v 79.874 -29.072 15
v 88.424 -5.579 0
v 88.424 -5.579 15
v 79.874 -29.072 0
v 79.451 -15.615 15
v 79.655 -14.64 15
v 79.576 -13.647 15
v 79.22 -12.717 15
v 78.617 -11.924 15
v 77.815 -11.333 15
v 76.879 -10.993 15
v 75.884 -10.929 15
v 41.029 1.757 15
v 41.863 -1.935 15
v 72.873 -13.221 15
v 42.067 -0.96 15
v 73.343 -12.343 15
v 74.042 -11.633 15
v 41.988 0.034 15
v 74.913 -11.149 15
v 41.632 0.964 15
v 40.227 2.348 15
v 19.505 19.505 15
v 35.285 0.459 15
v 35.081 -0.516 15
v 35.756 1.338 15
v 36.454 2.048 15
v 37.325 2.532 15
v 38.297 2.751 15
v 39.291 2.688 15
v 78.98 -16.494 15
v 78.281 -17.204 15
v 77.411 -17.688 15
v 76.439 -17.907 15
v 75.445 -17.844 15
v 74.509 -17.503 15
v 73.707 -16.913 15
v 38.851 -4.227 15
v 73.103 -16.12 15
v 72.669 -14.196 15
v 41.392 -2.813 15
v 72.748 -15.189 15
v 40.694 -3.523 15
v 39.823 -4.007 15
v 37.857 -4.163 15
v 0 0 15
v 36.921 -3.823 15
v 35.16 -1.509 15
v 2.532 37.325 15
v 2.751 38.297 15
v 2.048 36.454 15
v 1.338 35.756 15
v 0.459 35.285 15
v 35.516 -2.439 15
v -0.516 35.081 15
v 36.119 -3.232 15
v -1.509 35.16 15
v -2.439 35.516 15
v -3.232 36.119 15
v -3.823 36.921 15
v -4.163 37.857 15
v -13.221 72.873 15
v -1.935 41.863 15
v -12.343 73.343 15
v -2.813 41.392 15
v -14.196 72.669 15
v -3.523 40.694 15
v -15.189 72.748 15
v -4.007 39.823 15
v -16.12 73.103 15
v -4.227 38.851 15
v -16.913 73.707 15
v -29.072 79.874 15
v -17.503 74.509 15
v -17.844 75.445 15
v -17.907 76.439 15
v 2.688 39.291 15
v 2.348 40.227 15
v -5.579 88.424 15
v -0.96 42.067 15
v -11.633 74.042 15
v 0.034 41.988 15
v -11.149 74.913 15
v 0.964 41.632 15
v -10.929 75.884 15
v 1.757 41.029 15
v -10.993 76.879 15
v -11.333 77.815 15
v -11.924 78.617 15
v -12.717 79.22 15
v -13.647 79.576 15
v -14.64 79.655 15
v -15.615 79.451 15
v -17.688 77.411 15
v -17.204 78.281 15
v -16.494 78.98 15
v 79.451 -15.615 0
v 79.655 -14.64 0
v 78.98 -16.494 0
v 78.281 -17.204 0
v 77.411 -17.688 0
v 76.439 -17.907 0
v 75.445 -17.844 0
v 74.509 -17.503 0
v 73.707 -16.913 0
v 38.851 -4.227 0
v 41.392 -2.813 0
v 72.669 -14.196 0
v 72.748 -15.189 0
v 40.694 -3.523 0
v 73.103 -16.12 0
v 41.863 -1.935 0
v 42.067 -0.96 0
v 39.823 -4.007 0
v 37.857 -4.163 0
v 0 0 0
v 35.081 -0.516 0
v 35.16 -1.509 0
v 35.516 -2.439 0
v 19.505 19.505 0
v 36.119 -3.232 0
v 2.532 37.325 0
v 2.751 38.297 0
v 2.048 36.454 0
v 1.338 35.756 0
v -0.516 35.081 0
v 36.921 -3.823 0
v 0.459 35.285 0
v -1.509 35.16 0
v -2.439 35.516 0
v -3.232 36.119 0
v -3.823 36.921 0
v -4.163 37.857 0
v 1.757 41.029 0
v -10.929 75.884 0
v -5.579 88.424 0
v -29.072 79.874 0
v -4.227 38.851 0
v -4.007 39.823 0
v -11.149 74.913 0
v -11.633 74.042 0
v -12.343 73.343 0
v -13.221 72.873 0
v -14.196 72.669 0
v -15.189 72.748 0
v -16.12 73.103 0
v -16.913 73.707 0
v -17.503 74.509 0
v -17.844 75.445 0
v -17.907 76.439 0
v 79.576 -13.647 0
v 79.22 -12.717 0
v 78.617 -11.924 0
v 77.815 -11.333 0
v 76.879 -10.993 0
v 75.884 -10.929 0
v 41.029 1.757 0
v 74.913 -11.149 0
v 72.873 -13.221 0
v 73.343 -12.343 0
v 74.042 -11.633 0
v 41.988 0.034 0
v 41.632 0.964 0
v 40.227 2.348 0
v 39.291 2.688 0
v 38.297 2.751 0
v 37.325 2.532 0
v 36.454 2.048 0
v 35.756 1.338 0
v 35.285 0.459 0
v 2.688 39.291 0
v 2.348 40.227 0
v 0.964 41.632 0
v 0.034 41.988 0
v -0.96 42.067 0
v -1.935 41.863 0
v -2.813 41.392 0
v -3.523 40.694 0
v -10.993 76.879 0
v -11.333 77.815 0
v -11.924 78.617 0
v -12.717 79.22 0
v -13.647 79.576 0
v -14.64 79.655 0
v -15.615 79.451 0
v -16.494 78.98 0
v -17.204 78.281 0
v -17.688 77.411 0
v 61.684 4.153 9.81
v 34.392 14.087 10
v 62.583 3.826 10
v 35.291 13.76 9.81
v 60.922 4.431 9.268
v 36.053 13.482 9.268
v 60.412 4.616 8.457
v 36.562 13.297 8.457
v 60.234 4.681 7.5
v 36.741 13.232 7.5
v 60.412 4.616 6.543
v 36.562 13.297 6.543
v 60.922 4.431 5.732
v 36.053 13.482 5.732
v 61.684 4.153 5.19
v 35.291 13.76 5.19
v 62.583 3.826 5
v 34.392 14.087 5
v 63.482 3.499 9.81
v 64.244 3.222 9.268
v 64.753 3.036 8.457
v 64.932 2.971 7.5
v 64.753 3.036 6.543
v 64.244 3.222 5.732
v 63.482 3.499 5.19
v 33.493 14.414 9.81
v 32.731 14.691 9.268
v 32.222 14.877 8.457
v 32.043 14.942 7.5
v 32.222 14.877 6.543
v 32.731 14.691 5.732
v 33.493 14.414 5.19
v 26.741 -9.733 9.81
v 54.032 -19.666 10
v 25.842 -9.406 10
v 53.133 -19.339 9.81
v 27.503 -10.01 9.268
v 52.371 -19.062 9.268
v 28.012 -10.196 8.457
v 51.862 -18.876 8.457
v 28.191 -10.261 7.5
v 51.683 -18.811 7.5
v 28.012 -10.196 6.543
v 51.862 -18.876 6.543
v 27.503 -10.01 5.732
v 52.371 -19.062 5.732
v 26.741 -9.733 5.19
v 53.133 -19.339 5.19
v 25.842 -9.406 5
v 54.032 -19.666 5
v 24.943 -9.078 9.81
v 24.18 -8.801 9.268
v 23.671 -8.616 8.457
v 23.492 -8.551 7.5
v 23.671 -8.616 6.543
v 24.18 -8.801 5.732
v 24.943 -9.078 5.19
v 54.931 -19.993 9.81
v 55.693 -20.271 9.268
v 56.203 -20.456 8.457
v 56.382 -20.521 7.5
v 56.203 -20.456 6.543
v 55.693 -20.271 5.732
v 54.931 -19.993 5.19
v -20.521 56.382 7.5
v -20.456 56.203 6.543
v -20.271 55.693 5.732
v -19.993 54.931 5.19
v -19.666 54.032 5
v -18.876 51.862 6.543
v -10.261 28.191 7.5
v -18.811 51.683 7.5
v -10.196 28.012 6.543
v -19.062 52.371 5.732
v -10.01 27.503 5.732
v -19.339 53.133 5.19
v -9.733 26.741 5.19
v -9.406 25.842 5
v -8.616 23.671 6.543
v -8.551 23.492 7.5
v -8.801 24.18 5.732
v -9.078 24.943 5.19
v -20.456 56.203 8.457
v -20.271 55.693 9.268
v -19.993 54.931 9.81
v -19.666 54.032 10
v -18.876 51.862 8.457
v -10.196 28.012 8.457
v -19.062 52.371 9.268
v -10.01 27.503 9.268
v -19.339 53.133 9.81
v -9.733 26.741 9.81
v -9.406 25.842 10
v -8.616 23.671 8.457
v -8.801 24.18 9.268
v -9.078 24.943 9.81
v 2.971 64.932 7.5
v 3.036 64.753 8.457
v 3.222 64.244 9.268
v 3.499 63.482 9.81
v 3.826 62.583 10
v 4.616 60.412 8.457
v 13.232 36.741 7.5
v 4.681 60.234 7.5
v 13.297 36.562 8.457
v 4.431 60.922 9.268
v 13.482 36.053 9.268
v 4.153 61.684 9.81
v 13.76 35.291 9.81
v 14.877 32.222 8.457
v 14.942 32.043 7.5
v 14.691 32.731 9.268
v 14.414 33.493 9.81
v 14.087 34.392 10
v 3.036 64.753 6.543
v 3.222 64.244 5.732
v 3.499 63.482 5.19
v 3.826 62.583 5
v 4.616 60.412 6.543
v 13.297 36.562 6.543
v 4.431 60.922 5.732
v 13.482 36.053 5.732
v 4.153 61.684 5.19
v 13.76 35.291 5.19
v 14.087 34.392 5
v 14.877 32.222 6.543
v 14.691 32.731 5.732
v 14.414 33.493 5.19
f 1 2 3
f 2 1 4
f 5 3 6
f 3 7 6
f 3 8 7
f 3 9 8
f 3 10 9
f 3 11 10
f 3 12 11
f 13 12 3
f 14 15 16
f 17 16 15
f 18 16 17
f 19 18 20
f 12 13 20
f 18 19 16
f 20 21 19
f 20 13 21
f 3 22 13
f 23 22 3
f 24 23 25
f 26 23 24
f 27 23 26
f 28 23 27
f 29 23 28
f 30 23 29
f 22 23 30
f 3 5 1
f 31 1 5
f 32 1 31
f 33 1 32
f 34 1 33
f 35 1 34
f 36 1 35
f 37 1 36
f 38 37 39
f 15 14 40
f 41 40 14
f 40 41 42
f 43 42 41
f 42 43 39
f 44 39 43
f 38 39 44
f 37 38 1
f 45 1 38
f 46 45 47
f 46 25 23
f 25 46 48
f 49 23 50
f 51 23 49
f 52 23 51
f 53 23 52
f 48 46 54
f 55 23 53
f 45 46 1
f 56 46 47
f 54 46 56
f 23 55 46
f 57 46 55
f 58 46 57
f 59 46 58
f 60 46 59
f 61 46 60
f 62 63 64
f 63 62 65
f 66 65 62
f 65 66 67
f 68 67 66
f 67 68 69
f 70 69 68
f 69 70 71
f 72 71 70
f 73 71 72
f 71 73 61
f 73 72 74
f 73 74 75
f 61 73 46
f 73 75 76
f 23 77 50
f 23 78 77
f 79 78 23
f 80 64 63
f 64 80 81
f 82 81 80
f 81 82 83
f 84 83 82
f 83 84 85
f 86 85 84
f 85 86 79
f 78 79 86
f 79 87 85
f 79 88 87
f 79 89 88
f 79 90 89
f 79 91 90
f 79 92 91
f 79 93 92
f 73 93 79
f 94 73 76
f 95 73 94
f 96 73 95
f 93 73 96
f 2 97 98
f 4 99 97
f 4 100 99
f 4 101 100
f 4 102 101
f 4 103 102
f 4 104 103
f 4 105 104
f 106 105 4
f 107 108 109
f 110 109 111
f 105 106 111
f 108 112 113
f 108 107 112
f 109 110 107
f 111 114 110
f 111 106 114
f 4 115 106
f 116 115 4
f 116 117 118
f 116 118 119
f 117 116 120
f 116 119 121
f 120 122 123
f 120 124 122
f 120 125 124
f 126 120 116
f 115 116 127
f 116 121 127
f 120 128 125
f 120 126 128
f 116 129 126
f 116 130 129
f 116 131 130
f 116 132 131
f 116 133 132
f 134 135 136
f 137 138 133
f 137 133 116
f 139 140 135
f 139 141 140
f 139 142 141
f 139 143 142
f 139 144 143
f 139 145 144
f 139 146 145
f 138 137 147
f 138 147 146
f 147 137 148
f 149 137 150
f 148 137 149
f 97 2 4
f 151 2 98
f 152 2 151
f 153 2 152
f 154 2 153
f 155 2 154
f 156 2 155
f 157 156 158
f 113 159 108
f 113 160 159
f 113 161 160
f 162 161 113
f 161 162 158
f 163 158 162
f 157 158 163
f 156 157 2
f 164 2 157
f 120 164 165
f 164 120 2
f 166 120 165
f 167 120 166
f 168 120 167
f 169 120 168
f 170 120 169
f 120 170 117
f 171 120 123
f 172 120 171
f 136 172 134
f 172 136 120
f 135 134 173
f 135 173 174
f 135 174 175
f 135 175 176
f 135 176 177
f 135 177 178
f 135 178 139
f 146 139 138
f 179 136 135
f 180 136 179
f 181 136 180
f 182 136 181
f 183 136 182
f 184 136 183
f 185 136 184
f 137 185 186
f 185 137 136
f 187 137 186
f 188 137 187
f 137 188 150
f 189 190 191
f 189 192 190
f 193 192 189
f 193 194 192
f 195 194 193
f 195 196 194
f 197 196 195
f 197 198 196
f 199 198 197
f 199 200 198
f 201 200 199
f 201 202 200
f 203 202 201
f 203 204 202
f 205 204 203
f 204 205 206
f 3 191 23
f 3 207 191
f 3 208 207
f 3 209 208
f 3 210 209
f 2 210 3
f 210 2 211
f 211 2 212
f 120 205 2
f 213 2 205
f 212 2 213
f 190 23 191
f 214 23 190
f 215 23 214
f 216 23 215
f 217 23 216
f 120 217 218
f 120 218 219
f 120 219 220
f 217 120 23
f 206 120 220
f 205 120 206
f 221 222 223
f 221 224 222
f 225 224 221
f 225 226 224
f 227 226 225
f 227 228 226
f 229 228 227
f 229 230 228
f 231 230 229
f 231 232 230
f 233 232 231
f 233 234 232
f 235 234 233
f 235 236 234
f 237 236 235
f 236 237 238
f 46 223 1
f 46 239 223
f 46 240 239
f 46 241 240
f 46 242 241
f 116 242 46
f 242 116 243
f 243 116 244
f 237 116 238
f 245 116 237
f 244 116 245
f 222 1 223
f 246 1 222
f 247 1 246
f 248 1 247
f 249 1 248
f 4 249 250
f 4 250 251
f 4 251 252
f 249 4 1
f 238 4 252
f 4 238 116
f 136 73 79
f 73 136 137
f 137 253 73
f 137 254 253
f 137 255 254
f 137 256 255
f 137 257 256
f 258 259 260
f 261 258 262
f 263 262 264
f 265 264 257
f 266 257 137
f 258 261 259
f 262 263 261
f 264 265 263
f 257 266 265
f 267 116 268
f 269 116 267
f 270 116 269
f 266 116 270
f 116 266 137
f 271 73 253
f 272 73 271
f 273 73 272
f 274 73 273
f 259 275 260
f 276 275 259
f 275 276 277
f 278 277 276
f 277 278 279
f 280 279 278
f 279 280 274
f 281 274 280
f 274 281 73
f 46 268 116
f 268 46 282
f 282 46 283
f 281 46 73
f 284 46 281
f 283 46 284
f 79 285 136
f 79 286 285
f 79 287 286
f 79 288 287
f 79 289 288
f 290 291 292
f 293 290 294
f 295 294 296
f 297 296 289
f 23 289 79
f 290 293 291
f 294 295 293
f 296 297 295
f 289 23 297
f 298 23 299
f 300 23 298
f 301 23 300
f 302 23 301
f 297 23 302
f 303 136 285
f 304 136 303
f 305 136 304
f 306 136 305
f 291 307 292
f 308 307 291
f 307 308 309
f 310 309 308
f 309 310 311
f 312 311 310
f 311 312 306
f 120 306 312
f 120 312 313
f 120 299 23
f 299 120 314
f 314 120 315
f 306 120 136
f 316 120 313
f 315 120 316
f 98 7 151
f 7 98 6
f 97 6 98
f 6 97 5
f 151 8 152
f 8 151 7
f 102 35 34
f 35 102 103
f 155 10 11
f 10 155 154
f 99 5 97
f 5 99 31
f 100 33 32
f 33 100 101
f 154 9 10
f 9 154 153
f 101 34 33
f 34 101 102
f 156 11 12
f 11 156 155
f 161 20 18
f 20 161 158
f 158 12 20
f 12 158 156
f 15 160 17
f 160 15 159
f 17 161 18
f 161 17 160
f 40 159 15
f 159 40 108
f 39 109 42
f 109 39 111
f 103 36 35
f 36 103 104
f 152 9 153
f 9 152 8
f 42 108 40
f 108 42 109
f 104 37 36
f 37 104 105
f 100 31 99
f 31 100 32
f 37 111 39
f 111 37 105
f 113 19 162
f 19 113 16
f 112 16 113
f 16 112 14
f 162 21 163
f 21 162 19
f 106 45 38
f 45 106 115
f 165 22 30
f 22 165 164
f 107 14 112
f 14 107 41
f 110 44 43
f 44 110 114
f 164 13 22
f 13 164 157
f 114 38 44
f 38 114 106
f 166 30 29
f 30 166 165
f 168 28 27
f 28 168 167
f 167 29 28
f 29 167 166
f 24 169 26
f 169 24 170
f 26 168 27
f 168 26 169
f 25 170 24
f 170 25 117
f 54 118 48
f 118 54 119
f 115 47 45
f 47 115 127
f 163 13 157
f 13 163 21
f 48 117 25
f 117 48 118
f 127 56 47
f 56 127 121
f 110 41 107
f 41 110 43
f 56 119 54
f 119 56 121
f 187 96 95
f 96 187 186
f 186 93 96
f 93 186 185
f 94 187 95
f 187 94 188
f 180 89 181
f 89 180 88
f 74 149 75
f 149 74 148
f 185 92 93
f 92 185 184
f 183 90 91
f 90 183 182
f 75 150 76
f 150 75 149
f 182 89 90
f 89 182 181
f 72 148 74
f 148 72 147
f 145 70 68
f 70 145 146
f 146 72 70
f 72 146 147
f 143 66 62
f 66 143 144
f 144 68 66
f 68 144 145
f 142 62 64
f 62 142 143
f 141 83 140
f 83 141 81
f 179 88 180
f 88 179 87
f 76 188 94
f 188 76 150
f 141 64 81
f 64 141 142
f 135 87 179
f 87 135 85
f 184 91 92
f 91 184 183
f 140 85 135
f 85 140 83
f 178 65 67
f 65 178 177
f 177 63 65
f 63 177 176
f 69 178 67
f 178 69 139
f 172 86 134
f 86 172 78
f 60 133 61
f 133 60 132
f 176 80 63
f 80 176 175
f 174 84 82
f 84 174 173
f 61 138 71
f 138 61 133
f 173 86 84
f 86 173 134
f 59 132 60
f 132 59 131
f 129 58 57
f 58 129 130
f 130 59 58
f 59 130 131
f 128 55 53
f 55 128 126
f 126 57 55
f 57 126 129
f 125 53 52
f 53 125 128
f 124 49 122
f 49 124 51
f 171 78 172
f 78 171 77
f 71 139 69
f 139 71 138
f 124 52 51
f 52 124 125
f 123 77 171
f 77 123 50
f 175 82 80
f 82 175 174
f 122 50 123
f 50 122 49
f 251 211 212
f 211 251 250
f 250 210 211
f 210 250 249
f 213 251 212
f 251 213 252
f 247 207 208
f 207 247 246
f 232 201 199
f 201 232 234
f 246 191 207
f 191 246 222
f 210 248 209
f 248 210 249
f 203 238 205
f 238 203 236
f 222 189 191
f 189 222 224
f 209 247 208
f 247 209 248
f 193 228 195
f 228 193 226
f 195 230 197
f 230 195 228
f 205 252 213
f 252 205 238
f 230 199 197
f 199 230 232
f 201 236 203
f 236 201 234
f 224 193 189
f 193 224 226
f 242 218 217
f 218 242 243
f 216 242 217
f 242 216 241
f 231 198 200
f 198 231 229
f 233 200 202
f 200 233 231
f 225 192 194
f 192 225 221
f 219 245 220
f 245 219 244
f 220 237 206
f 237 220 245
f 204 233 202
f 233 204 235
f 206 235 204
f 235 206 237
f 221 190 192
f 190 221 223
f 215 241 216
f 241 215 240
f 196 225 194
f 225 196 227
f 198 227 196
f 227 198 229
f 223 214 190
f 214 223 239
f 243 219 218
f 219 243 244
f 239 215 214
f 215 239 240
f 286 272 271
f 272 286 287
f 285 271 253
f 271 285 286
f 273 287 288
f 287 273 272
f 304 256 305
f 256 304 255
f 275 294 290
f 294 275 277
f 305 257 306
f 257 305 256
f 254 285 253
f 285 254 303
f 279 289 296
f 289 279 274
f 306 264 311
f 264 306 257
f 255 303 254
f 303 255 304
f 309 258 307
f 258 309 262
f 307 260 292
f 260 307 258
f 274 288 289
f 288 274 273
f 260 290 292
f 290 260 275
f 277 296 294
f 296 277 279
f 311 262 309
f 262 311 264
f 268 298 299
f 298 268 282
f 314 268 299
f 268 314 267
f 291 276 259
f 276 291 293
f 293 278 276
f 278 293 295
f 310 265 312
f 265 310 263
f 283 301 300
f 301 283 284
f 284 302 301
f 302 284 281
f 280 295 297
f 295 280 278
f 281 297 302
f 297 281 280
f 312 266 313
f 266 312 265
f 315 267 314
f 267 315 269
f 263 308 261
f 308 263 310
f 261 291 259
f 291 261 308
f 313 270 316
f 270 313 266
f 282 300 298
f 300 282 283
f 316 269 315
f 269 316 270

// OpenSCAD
/*
 *  Universal Angle (Winkel) by RoHa
 *  http://www.thingiverse.com/thing:1398497
 *
 *  Historiy:
 *  2016-03-07  ReleaseV1
 *
 */

Angle = 130; // [90:180]
SideA_Length = 8.5;
SideA_Width = 1.5;
SideA_Height = 2.5;
SideB_Length = 8.5;
SideB_Width = 1.5;
SideB_Height = 2.5;
Hole1A_Show = "yes"; // [yes,no]
Hole1A_Offset = 0.5;
Hole1A_Diameter = 0.7;
Hole2A_Show = "yes"; // [yes,no]
Hole2A_Offset = 4.5;
Hole2A_Diameter = 0.7;
Hole3B_Show = "yes"; // [yes,no]
Hole3B_Offset = 0.5;
Hole3B_Diameter = 0.7;
Hole4B_Show = "yes"; // [yes,no]
Hole4B_Offset = 4.5;
Hole4B_Diameter = 0.7;
Hole5A_Show = "yes"; // [yes,no]
Hole5A_Offset = 2.5;
Hole5A_Diameter = 0.5;
Hole6A_Show = "yes"; // [yes,no]
Hole6A_Offset = 5.5;
Hole6A_Diameter = 0.5;
Hole7B_Show = "yes"; // [yes,no]
Hole7B_Offset = 2.5;
Hole7B_Diameter = 0.5;
Hole8B_Show = "yes"; // [yes,no]
Hole8B_Offset = 5.5;
Hole8B_Diameter = 0.5;
Hole_Detail = 0.1;
Printer_X = 15;
Printer_Y = 15;
Printer_Z = 0;
Version = 1; // [1]
dx = Printer_X;
dy = Printer_Y;
dz = Printer_Z;
wg = Angle;
wal = SideA_Length;
wab = SideA_Width;
wah = SideA_Height;
wbl = SideB_Length;
wbb = SideB_Width;
wbh = SideB_Height;
wlg = Hole_Detail;
wl1a = Hole1A_Offset;
wl1r = Hole1A_Diameter/2;
wl2a = Hole2A_Offset;
wl2r = Hole2A_Diameter/2;
wl3a = Hole3B_Offset;
wl3r = Hole3B_Diameter/2;
wl4a = Hole4B_Offset;
wl4r = Hole4B_Diameter/2;
wl5a = Hole5A_Offset;
wl5r = Hole5A_Diameter/2;
wl6a = Hole6A_Offset;
wl6r = Hole6A_Diameter/2;
wl7a = Hole7B_Offset;
wl7r = Hole7B_Diameter/2;
wl8a = Hole8B_Offset;
wl8r = Hole8B_Diameter/2;
bugfix = 0.1;

// Skalierung von MM in CM
scale(10)
union() {
  // Druckbett visualisieren
  if (dz>0) {
    druckbett();
  }
  // fuer optimalen Druck ausrichten
  rotate([0,0,-wg/2+45]) 
  // >>> LoecherB-Innen ausschneiden
  rotate([0,0,wg]) 
  rotate([90,0,0]) 
  translate([0,wbb,-bugfix/2])
  difference() {
  translate([0,-wbb,bugfix/2])
  rotate([-90,0,0]) 
  rotate([0,0,-wg]) 
    // >>> LoecherA-Innen ausschneiden
    rotate([-90,0,0]) 
    difference() {
      rotate([90,0,0]) 
      union () {
        // >>> LoecherB-Aussen ausschneiden
        rotate([0,0,wg]) 
        difference() {
          rotate([0,0,-wg]) 
          difference() {
            // Basismodell fuer Winkel
            winkel_basis();
            // >>> LoecherA-Aussen ausschneiden
            if (Hole1A_Show == "yes") {
              color("blue")
              translate([wal-wl1a-wl1r,wah/2,0])
              cylinder(wab,wl1r,wl1r,$fs=wlg);
            }
            if (Hole2A_Show == "yes") {
              color("blue")
              translate([wal-wl2a-wl2r,wah/2,0])
              cylinder(wab,wl2r,wl2r,$fs=wlg);
            }
            // <<< LoecherA-Aussen
          }
          // LoecherB
          if (Hole3B_Show == "yes") {
            color("blue")
            translate([wbl-wl3a-wl3r,-wbh/2,0])
            cylinder(wbb,wl3r,wl3r,$fs=wlg);
          }
          if (Hole4B_Show == "yes") {
            color("blue")
            translate([wbl-wl4a-wl4r,-wbh/2,0])
            cylinder(wbb,wl4r,wl4r,$fs=wlg);
          }
        }
        // <<< LoecherB-Aussen
      }
      // LoecherA
      if (Hole5A_Show == "yes") {
        color("blue")
        translate([wal-wl5a-wl5r,-wab/2,0])
        cylinder(wah,wl5r,wl5r,$fs=wlg);
      }
      if (Hole6A_Show == "yes") {
        color("blue")
        translate([wal-wl6a-wl6r,-wab/2,0])
        cylinder(wah,wl6r,wl6r,$fs=wlg);
      }
    }
    // <<< LoecherA-Innen
    // LoecherB
    if (Hole7B_Show == "yes") {
      color("blue")
      translate([wbl-wl7a-wl7r,-wbb/2,0])
      cylinder(wbh+bugfix,wl7r,wl7r,$fs=wlg);
    }
    if (Hole8B_Show == "yes") {
      color("blue")
      translate([wbl-wl8a-wl8r,-wbb/2,0])
      cylinder(wbh+bugfix,wl8r,wl8r,$fs=wlg);
    }
  }
  // >>> LoecherB-Innen
}

// Winkel
module winkel_basis() {
  union() {
    cube([wal,wah,wab]);
    color("red") 
    translate([0,0,wbb])
    rotate([180,0,0]) 
    rotate([0,0,-wg]) 
    cube([wbl,wbh,wbb]);
  }
}

// Druckbett
module druckbett() {
  color("gray")
  translate([-dx/2,-dy/2,-1])
  cube([dx,dy,1]);
}
